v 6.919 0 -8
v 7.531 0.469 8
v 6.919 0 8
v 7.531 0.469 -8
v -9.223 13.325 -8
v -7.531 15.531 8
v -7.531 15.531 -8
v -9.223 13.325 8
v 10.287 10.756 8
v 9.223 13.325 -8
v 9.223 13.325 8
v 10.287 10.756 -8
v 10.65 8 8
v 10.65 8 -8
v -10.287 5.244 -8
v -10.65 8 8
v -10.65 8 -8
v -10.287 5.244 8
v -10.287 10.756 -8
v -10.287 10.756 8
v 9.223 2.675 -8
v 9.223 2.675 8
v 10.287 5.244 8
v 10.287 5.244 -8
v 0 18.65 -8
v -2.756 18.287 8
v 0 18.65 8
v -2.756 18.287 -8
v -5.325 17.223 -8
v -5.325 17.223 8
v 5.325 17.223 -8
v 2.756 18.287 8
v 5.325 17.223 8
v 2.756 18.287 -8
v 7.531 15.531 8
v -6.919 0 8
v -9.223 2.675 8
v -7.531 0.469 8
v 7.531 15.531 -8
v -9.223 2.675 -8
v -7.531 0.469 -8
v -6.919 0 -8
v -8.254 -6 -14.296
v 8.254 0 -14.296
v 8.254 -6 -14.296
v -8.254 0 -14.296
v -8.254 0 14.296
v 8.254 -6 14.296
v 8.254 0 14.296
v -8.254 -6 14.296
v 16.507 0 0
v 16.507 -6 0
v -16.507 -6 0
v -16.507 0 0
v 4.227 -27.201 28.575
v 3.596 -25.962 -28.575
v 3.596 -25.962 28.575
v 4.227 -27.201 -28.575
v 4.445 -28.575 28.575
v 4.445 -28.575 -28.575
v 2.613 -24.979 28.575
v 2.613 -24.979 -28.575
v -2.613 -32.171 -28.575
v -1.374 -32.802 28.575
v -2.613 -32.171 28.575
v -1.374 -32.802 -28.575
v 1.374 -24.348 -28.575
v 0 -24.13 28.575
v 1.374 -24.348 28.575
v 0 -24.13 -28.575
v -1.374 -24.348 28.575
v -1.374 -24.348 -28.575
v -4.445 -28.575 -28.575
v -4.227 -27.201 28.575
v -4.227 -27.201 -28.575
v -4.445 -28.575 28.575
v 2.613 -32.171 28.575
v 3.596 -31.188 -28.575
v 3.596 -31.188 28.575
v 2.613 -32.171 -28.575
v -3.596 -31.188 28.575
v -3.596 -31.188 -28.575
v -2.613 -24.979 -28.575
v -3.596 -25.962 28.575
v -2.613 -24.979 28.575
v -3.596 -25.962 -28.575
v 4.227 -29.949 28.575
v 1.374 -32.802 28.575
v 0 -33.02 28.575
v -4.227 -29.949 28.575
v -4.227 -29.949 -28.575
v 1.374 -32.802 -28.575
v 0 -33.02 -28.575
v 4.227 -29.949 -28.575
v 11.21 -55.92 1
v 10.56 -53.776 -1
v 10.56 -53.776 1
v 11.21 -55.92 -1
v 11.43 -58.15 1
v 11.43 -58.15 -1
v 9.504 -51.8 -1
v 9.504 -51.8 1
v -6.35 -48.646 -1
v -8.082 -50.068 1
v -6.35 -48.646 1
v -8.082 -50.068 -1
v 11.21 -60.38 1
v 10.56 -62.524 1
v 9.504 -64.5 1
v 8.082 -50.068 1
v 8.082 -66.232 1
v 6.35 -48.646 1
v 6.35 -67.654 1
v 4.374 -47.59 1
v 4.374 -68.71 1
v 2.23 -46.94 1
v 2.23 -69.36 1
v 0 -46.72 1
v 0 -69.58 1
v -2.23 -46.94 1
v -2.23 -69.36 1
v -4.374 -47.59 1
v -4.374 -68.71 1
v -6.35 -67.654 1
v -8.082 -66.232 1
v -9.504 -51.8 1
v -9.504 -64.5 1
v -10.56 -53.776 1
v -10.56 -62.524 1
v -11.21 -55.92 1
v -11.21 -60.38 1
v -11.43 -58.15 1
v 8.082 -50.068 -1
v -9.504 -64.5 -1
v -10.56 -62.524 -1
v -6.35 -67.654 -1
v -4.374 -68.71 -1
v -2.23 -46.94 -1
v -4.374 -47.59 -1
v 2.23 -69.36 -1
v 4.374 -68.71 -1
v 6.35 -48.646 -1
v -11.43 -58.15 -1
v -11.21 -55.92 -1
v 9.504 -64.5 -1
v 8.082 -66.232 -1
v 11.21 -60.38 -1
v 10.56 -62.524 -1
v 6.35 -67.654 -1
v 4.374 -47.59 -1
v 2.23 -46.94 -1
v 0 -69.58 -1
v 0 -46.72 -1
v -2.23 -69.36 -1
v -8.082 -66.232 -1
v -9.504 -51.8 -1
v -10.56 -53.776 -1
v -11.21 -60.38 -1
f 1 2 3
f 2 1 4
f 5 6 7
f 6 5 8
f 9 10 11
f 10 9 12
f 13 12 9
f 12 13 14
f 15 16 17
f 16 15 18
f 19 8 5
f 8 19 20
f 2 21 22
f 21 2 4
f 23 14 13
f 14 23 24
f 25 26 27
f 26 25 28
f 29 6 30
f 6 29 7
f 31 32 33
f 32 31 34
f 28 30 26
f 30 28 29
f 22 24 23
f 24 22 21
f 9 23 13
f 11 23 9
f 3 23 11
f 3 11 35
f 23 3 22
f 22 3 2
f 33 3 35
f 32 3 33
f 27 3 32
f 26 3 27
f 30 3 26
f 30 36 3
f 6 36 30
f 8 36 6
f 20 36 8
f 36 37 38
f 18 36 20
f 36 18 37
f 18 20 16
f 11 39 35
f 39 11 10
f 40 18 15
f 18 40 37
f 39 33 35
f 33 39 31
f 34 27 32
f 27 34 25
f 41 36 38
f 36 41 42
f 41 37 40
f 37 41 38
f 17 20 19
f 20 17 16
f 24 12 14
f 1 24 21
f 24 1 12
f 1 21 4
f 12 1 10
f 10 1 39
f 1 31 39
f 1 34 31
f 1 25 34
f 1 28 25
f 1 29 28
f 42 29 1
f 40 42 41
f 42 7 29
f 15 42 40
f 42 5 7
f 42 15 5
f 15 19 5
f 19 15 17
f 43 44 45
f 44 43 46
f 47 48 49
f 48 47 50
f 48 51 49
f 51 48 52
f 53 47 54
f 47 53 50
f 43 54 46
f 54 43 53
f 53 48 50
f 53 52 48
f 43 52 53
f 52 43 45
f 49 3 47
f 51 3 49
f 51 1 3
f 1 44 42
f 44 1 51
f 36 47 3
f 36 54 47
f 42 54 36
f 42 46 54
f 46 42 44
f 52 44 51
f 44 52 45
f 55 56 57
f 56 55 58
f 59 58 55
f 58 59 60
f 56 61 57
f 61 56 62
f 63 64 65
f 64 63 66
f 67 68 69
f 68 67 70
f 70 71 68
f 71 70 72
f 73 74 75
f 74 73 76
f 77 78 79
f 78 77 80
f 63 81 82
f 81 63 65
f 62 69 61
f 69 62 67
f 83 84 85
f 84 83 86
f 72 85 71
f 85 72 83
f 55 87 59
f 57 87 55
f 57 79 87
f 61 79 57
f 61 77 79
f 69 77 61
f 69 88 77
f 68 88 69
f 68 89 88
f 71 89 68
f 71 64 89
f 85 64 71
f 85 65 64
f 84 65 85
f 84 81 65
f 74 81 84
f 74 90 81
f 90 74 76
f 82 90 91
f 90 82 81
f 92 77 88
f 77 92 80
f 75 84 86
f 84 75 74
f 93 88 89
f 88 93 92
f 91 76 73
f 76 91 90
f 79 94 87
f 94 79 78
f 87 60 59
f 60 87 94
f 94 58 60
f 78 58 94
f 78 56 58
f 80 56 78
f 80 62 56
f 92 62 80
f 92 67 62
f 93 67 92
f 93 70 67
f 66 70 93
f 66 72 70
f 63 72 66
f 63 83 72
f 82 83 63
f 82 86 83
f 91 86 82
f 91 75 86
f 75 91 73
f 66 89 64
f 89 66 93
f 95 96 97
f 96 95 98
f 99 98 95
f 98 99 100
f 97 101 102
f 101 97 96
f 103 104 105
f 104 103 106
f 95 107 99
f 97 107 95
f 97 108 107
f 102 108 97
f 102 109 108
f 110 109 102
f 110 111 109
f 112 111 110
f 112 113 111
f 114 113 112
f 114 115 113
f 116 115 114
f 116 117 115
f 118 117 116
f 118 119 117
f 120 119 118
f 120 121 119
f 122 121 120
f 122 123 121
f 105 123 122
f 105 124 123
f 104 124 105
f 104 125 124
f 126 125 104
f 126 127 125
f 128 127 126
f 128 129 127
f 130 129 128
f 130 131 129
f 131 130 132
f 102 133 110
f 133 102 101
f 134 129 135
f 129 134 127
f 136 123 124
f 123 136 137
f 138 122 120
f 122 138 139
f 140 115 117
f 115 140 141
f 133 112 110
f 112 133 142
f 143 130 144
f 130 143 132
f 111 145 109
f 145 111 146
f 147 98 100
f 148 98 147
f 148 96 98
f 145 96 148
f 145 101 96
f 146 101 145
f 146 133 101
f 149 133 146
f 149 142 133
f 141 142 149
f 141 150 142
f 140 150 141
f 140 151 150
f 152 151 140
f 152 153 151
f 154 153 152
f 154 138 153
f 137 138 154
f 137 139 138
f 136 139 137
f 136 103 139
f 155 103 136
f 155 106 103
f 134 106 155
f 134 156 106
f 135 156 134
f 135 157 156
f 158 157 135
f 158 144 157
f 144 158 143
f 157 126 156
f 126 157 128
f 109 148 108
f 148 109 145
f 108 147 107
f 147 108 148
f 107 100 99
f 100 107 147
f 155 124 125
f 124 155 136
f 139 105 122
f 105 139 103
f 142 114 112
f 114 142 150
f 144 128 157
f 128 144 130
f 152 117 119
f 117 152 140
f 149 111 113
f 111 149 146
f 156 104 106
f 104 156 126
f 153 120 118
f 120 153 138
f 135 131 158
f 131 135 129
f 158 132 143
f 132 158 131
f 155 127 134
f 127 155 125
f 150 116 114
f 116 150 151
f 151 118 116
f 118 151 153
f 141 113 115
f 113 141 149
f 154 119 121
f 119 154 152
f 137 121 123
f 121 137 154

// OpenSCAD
// Auto-generated by scripts/author_from_manifest.py (Phase D.3).
// Source: data/phase_d_manifest.json (sku_intent='tyco-ec11-pendent-k112-135f').
// Do not hand-edit — regenerate from the manifest.
//
// @part tyco_ec11_pendent_k112_135f
// @kind sprinkler_head
// @category head.pendant.k112
// @display-name "Tyco EC-11 Extended Coverage Pendent K11.2 135°F"
// @mfg tyco_fire_protection
// @mfg-pn EC-11
// @listing UL FM
// @hazard-classes OH1 OH2
// @price-usd 34.00
// @install-minutes 10
// @crew journeyman
// @k-factor 11.2
// @orientation pendant
// @response standard
// @temperature 135F
// @param size_in number default=0.5 label="Size" unit="in"
// @port inlet position=[0,0.014,0] direction=[0,1,0] style=NPT_threaded size_in=0.75 role=drop

size_in = 0.5;
k_factor = 11.2;

length_mm   = 57.15;
body_dia_mm = 25.40;
thread_od   = 21.3;
thread_len  = 16;
deflector_d = body_dia_mm * 0.9;

 union() {
    translate([0, thread_len/2, 0])
        cylinder(h = thread_len, d = thread_od, center = true, $fn = 24);
    translate([0, -3, 0])
        rotate([90, 0, 0])
        cylinder(h = 6, d = thread_od * 1.55, $fn = 6, center = true);
    translate([0, -length_mm/2, 0])
        cylinder(h = length_mm, d = body_dia_mm * 0.35, center = true, $fn = 20);
    translate([0, -length_mm - 1, 0])
        cylinder(h = 2, d = deflector_d, center = true, $fn = 32);
}
